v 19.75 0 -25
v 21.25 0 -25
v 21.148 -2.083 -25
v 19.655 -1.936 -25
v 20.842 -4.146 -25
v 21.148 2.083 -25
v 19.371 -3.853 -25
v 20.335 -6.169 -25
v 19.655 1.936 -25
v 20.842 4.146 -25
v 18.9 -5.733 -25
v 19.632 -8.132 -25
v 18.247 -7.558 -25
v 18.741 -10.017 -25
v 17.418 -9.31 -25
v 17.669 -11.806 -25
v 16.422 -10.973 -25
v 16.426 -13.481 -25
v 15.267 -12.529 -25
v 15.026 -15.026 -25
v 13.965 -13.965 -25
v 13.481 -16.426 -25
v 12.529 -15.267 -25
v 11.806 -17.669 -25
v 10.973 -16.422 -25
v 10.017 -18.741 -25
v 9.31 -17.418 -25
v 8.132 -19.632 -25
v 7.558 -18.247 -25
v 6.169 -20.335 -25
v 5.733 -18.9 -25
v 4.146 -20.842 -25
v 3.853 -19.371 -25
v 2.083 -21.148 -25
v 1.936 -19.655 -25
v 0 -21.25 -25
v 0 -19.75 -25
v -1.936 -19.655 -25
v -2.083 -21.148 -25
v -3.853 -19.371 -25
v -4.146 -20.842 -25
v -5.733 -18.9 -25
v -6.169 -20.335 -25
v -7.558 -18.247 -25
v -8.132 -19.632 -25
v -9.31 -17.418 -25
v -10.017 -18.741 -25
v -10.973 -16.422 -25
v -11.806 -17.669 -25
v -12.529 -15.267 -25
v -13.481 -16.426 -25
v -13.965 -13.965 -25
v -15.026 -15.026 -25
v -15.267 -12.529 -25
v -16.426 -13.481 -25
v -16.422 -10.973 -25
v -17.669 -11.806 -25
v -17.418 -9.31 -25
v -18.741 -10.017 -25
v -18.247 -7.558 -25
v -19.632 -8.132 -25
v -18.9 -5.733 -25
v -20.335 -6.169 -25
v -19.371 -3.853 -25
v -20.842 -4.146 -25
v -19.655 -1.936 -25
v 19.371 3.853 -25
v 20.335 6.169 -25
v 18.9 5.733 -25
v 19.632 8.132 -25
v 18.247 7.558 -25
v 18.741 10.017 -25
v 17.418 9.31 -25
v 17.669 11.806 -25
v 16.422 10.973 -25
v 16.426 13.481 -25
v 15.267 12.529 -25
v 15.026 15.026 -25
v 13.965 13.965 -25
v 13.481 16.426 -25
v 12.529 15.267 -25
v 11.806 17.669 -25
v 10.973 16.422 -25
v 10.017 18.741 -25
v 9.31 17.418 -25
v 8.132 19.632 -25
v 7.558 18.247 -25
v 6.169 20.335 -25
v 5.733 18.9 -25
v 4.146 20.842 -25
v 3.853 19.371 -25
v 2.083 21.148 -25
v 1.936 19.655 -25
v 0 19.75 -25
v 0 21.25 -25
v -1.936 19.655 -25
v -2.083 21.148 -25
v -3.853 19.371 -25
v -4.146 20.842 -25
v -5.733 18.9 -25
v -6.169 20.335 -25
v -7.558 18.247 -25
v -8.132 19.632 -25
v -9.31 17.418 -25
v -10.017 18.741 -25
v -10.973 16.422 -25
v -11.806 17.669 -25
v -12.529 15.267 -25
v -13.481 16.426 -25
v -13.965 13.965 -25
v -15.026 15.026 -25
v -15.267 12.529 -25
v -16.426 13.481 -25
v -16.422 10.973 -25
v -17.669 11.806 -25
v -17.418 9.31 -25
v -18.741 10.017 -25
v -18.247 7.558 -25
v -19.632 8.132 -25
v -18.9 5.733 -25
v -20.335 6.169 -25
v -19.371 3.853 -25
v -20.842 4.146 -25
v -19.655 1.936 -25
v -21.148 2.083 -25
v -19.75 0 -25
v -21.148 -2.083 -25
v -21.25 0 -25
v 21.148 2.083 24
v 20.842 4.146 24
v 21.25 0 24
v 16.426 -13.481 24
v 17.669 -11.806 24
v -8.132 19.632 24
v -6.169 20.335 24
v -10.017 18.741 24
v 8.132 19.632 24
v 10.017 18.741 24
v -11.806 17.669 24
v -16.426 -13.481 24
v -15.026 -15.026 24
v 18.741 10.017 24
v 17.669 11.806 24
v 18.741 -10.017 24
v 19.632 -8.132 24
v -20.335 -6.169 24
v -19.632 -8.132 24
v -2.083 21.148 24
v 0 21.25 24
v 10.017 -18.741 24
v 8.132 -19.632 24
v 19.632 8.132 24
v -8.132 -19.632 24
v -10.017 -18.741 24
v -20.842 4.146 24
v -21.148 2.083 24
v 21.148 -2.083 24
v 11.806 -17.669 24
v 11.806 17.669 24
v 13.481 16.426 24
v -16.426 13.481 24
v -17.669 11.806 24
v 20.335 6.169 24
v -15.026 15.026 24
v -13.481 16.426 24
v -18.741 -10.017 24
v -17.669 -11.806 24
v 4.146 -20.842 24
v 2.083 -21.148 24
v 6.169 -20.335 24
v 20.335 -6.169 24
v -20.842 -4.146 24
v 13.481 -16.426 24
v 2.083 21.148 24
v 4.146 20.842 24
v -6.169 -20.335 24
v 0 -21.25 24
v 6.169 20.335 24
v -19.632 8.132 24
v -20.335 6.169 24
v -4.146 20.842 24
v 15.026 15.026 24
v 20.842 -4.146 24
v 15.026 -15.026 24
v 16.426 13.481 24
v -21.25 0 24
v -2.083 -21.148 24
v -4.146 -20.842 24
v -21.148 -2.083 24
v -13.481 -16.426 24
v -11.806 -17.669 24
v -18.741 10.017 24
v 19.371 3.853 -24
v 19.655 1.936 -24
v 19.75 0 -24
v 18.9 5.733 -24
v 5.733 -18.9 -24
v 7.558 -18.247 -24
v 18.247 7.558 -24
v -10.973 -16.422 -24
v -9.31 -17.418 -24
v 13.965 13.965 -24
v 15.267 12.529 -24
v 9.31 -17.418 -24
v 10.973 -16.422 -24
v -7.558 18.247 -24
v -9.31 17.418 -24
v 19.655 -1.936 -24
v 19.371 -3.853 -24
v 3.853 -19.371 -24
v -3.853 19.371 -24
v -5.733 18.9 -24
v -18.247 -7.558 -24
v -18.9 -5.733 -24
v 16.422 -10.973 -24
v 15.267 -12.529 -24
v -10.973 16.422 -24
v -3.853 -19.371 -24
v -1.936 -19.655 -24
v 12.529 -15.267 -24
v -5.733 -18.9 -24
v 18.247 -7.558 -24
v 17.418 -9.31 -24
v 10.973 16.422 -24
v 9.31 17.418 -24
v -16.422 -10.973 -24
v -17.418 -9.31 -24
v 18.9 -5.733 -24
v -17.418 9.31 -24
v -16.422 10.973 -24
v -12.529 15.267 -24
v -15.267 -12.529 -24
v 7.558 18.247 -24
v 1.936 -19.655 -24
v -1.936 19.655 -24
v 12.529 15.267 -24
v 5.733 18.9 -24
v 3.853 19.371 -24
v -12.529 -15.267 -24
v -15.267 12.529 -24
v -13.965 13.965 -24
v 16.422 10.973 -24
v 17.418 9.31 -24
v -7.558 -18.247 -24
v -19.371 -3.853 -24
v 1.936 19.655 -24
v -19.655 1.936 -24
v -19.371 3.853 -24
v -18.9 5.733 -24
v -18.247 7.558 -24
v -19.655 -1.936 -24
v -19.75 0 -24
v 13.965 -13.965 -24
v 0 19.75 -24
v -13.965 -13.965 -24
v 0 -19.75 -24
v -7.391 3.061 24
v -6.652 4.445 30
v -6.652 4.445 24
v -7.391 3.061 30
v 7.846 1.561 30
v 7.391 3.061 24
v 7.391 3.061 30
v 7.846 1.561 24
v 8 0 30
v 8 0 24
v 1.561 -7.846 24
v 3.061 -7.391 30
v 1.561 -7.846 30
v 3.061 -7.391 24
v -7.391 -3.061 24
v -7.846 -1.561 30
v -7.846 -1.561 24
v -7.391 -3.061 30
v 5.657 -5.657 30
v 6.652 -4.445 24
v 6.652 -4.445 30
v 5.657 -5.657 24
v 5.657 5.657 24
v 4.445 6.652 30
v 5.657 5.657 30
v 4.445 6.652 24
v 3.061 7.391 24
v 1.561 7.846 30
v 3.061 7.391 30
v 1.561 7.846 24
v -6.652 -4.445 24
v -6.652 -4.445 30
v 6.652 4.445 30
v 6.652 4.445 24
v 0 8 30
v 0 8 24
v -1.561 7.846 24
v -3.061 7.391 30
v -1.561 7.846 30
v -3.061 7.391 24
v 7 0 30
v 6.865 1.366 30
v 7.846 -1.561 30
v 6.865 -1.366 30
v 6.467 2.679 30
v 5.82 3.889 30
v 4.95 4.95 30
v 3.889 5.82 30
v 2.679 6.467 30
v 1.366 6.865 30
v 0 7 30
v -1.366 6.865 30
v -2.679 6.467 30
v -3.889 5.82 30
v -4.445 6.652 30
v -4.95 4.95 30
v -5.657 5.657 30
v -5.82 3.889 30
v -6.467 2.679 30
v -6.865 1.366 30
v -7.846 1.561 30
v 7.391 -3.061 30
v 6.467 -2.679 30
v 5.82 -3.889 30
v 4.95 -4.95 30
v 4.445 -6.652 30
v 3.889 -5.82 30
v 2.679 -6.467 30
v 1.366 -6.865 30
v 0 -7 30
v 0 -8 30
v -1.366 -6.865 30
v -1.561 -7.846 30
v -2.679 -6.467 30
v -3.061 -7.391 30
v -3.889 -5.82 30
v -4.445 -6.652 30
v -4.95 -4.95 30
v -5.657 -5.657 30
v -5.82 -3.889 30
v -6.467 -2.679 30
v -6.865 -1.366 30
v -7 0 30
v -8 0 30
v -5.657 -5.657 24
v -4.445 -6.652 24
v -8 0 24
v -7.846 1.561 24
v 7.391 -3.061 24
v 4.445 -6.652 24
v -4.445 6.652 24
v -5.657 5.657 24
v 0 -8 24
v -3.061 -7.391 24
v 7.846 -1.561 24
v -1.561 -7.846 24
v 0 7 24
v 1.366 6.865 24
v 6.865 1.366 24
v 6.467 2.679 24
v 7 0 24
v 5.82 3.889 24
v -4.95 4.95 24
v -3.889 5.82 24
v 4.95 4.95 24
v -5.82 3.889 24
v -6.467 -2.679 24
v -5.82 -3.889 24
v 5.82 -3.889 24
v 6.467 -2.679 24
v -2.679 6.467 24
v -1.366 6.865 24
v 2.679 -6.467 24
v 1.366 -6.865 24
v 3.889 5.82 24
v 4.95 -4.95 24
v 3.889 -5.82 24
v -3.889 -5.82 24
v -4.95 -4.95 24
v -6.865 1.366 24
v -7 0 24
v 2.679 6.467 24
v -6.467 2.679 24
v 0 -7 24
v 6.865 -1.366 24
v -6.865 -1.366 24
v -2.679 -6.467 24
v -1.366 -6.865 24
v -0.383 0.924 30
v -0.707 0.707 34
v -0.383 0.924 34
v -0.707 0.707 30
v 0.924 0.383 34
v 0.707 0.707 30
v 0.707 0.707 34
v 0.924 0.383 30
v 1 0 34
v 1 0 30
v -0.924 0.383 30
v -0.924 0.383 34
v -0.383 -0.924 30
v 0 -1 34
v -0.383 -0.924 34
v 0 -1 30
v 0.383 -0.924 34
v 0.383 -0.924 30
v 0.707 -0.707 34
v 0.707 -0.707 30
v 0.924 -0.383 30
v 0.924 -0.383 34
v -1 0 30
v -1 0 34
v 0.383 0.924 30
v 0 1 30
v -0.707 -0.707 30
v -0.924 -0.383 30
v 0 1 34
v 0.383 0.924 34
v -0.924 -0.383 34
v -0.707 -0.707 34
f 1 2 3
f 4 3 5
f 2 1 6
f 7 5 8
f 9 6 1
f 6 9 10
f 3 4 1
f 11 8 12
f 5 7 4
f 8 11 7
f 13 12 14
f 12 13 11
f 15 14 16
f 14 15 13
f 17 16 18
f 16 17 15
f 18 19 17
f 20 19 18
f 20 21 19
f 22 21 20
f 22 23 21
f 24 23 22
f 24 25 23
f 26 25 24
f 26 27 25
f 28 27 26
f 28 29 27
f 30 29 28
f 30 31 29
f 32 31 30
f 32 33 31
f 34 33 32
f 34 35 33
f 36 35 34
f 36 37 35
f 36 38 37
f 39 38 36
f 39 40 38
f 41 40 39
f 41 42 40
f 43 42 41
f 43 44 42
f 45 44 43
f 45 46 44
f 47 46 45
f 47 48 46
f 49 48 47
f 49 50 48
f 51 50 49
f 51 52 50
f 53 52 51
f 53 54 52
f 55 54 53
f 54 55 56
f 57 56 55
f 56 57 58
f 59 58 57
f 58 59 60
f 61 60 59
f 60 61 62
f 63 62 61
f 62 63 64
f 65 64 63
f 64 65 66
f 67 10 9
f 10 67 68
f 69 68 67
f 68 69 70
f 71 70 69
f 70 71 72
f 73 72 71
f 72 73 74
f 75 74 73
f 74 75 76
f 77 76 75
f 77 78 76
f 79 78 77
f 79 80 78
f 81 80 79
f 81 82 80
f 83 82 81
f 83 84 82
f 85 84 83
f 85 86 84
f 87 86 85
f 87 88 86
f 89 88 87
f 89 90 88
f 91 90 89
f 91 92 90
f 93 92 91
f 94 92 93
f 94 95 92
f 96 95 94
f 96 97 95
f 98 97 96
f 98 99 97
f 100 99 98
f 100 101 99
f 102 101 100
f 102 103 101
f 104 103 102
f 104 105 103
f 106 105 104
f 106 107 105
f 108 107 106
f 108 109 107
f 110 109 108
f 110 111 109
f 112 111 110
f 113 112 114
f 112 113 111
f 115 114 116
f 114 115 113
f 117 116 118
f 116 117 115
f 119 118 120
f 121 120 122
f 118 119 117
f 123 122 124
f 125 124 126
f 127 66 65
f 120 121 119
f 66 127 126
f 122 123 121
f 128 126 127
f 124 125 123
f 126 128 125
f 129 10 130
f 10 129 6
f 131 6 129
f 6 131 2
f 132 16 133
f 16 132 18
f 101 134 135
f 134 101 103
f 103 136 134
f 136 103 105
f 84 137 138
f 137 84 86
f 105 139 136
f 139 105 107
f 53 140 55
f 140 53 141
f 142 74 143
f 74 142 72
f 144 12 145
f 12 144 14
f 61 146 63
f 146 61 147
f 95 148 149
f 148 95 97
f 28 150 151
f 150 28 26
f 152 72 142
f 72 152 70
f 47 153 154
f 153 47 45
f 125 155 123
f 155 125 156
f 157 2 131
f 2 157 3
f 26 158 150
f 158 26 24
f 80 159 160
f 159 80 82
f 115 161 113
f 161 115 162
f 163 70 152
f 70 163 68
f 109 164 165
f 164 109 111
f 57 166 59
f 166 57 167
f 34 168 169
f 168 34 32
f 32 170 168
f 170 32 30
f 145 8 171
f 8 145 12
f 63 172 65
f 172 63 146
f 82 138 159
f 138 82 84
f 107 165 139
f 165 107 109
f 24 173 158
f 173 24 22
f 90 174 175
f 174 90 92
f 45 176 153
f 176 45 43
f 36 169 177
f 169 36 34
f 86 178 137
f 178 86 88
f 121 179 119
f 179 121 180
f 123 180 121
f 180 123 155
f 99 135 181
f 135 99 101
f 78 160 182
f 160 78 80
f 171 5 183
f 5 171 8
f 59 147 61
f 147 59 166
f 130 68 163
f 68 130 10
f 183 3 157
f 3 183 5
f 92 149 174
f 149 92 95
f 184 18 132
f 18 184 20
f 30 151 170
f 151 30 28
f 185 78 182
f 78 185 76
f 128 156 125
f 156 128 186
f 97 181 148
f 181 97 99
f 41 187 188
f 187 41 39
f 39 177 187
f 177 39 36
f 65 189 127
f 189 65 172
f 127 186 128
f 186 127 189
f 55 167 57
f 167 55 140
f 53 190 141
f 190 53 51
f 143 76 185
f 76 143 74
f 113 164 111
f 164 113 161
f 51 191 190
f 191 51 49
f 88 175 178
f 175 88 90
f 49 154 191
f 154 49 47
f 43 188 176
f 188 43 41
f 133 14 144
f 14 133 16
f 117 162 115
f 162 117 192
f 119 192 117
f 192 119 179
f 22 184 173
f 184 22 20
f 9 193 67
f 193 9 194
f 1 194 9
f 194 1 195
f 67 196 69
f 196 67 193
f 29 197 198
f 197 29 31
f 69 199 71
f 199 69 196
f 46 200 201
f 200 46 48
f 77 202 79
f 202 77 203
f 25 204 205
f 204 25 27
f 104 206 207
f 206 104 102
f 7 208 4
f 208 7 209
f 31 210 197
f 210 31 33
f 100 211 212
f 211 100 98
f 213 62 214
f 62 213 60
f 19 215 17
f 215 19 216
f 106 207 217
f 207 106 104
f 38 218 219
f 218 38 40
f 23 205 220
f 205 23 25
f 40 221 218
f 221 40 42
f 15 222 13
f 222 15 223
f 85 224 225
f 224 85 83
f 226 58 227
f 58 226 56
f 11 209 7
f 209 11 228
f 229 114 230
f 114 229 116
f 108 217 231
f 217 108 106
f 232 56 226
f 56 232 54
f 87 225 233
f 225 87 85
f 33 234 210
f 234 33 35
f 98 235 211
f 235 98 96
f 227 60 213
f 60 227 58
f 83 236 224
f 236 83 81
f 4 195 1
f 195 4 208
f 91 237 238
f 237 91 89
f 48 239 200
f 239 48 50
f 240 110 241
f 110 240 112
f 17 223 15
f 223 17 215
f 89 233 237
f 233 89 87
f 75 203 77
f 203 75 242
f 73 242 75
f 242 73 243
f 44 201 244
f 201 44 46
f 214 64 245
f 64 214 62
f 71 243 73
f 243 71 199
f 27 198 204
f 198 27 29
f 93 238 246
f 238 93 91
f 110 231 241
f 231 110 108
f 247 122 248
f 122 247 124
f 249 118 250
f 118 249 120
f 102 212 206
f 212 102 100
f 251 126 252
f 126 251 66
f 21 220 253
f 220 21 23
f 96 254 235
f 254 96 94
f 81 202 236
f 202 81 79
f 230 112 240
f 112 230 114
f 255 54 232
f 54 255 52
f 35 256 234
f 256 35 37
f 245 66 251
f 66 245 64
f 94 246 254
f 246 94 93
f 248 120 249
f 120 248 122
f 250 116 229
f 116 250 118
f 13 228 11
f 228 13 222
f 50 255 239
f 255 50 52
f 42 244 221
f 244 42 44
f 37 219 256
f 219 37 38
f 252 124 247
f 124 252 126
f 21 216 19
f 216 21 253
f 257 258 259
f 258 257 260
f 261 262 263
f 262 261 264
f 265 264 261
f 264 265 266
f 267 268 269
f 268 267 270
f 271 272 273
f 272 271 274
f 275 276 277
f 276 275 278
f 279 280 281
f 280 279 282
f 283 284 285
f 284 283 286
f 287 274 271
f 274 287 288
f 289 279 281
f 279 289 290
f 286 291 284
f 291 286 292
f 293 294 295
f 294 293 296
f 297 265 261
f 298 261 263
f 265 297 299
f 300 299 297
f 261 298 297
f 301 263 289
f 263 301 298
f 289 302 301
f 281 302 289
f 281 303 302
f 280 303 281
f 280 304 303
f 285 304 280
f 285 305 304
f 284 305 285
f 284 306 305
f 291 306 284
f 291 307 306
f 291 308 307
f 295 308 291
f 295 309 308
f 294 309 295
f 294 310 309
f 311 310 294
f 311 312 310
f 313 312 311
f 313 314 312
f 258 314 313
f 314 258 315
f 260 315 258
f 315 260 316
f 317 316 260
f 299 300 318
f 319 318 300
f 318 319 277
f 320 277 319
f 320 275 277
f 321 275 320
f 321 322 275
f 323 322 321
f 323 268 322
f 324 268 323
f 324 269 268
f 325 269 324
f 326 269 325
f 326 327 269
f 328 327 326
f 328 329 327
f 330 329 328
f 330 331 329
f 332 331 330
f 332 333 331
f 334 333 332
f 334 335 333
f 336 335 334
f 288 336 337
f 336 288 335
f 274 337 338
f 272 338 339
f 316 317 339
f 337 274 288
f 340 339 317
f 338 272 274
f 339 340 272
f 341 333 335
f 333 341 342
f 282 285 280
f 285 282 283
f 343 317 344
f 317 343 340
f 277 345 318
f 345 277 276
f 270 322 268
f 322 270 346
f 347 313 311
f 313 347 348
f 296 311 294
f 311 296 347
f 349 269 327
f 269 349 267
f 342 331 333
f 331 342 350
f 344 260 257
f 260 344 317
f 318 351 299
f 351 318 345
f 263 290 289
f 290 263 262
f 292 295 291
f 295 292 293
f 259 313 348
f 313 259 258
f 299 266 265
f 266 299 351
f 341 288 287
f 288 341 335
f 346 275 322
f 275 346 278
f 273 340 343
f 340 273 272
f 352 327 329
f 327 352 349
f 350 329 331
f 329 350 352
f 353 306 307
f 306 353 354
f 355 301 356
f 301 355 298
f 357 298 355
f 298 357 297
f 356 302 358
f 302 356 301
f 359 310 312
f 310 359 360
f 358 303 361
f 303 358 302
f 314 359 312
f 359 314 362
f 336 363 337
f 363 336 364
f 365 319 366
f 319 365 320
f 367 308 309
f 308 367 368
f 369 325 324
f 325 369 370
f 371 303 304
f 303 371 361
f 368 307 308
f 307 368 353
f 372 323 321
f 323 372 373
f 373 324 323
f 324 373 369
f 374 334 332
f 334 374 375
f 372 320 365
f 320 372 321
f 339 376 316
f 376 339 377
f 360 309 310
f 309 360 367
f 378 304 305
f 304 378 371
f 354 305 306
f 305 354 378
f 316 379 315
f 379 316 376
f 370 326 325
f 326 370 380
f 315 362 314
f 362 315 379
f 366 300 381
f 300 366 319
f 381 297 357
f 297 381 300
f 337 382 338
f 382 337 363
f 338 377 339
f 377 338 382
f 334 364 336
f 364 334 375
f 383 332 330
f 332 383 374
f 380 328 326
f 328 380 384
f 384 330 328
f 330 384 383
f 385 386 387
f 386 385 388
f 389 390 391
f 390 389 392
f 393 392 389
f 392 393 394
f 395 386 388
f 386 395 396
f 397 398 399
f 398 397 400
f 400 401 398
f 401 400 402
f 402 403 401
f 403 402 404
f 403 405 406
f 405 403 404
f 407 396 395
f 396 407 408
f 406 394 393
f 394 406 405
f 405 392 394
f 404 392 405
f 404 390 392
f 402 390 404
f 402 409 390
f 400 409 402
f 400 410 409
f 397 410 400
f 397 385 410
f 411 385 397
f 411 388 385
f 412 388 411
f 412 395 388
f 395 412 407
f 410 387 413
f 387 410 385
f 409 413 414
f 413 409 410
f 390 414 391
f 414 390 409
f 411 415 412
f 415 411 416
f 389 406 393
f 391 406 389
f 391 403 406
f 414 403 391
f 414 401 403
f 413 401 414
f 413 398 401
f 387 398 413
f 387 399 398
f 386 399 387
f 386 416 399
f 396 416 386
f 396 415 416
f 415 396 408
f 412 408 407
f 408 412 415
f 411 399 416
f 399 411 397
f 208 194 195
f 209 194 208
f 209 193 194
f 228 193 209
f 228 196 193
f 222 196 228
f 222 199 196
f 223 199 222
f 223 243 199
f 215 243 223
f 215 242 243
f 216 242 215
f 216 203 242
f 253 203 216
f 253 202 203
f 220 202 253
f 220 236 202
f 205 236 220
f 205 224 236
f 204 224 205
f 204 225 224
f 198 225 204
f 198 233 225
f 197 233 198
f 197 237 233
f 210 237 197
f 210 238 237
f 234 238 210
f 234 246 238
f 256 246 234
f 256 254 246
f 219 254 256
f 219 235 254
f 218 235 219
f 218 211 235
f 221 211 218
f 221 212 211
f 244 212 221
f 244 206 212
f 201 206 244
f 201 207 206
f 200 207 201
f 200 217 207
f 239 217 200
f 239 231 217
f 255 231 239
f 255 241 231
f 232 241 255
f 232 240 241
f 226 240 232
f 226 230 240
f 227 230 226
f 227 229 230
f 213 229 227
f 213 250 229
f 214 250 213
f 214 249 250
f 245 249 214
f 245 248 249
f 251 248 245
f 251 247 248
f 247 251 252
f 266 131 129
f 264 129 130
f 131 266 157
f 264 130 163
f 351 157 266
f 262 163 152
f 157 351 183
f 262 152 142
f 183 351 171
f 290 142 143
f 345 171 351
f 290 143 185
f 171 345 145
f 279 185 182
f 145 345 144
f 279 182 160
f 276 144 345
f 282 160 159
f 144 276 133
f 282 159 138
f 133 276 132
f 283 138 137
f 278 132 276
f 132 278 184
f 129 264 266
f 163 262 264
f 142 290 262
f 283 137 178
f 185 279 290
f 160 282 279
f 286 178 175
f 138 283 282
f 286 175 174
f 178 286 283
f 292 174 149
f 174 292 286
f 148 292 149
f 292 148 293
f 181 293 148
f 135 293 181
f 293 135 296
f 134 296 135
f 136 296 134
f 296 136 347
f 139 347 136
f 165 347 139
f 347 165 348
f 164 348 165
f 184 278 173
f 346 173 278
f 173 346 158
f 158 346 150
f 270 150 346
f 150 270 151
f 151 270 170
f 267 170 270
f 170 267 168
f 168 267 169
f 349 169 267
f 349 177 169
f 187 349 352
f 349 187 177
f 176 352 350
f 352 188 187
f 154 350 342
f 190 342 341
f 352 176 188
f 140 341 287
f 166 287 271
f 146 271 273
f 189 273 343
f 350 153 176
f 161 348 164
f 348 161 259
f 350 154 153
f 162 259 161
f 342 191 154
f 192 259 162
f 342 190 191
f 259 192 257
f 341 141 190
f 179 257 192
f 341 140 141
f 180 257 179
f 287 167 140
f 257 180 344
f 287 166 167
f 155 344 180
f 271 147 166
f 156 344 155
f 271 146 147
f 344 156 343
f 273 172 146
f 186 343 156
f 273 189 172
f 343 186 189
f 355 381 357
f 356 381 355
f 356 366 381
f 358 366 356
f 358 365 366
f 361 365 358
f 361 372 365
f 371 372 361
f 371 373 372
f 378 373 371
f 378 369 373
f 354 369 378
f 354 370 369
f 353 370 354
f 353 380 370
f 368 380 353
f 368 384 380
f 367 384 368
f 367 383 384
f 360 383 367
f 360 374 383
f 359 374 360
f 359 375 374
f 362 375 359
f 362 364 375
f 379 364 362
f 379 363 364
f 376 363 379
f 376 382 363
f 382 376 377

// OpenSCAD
// Parameters
stator_diameter_mm = 42.5; //[21.25:85:0.1]
outer_diameter_mm = 42.5; //[21.25:85:0.1]
motor_height_mm = 48; //[24:96:0.1]
tolerances_mm = 0; //[0:1:0.05]
stator_ref_wall_mm = 1.5; //[0.8:3:0.1]
stator_ref_height_mm = 12; //[6:24:0.5]
overlap_mm = 1; //[0.5:2:0.1]
buzzer_diameter_mm = 16; //[8:32:0.5]
buzzer_height_mm = 7; //[3:14:0.5]
buzzer_pin_diameter_mm = 2; //[1:4:0.1]
buzzer_pin_height_mm = 4; //[1:10:0.5]
buzzer_offset_x_mm = 0; //[-10:10:0.5]
buzzer_offset_y_mm = 0; //[-10:10:0.5]

// Buzzer - complete geometry
module buzzer() {
  color([0.2, 0.2, 0.22]) {
    // Buzzer body
    difference() {
      translate([buzzer_offset_x_mm, buzzer_offset_y_mm, motor_height_mm/2 + buzzer_height_mm/2 - overlap_mm])
        cylinder(r=buzzer_diameter_mm/2, h=buzzer_height_mm, center=true, $fn=32);
      translate([buzzer_offset_x_mm, buzzer_offset_y_mm, motor_height_mm/2 + buzzer_height_mm/2 - overlap_mm])
        cylinder(r=max((buzzer_diameter_mm/2 - buzzer_height_mm/7), 0.1), h=buzzer_height_mm + 2*overlap_mm, center=true, $fn=32);
    }
    // Buzzer pin
    translate([buzzer_offset_x_mm, buzzer_offset_y_mm, motor_height_mm/2 + buzzer_height_mm - overlap_mm + buzzer_pin_height_mm/2])
      cylinder(r=buzzer_pin_diameter_mm/2, h=buzzer_pin_height_mm, center=true, $fn=16);
  }
}

// Assembly - combines all parts
module assembly() {
  color("Black") {
    // Motor main cylinder
    translate([0, 0, 0])
      cylinder(r=(outer_diameter_mm + 2*tolerances_mm)/2, h=motor_height_mm, center=true, $fn=64);
  }
  color("Silver") {
    // Stator envelope reference
    difference() {
      translate([0, 0, -motor_height_mm/2 + stator_ref_height_mm/2 - overlap_mm])
        cylinder(r=(stator_diameter_mm + 2*tolerances_mm)/2, h=stator_ref_height_mm, center=true, $fn=64);
      translate([0, 0, -motor_height_mm/2 + stator_ref_height_mm/2 - overlap_mm])
        cylinder(r=max(((stator_diameter_mm + 2*tolerances_mm)/2 - stator_ref_wall_mm), 0.1), h=stator_ref_height_mm + 2*overlap_mm, center=true, $fn=64);
    }
  }
  // Buzzer
  buzzer();
}

// Final assembly call
assembly();
